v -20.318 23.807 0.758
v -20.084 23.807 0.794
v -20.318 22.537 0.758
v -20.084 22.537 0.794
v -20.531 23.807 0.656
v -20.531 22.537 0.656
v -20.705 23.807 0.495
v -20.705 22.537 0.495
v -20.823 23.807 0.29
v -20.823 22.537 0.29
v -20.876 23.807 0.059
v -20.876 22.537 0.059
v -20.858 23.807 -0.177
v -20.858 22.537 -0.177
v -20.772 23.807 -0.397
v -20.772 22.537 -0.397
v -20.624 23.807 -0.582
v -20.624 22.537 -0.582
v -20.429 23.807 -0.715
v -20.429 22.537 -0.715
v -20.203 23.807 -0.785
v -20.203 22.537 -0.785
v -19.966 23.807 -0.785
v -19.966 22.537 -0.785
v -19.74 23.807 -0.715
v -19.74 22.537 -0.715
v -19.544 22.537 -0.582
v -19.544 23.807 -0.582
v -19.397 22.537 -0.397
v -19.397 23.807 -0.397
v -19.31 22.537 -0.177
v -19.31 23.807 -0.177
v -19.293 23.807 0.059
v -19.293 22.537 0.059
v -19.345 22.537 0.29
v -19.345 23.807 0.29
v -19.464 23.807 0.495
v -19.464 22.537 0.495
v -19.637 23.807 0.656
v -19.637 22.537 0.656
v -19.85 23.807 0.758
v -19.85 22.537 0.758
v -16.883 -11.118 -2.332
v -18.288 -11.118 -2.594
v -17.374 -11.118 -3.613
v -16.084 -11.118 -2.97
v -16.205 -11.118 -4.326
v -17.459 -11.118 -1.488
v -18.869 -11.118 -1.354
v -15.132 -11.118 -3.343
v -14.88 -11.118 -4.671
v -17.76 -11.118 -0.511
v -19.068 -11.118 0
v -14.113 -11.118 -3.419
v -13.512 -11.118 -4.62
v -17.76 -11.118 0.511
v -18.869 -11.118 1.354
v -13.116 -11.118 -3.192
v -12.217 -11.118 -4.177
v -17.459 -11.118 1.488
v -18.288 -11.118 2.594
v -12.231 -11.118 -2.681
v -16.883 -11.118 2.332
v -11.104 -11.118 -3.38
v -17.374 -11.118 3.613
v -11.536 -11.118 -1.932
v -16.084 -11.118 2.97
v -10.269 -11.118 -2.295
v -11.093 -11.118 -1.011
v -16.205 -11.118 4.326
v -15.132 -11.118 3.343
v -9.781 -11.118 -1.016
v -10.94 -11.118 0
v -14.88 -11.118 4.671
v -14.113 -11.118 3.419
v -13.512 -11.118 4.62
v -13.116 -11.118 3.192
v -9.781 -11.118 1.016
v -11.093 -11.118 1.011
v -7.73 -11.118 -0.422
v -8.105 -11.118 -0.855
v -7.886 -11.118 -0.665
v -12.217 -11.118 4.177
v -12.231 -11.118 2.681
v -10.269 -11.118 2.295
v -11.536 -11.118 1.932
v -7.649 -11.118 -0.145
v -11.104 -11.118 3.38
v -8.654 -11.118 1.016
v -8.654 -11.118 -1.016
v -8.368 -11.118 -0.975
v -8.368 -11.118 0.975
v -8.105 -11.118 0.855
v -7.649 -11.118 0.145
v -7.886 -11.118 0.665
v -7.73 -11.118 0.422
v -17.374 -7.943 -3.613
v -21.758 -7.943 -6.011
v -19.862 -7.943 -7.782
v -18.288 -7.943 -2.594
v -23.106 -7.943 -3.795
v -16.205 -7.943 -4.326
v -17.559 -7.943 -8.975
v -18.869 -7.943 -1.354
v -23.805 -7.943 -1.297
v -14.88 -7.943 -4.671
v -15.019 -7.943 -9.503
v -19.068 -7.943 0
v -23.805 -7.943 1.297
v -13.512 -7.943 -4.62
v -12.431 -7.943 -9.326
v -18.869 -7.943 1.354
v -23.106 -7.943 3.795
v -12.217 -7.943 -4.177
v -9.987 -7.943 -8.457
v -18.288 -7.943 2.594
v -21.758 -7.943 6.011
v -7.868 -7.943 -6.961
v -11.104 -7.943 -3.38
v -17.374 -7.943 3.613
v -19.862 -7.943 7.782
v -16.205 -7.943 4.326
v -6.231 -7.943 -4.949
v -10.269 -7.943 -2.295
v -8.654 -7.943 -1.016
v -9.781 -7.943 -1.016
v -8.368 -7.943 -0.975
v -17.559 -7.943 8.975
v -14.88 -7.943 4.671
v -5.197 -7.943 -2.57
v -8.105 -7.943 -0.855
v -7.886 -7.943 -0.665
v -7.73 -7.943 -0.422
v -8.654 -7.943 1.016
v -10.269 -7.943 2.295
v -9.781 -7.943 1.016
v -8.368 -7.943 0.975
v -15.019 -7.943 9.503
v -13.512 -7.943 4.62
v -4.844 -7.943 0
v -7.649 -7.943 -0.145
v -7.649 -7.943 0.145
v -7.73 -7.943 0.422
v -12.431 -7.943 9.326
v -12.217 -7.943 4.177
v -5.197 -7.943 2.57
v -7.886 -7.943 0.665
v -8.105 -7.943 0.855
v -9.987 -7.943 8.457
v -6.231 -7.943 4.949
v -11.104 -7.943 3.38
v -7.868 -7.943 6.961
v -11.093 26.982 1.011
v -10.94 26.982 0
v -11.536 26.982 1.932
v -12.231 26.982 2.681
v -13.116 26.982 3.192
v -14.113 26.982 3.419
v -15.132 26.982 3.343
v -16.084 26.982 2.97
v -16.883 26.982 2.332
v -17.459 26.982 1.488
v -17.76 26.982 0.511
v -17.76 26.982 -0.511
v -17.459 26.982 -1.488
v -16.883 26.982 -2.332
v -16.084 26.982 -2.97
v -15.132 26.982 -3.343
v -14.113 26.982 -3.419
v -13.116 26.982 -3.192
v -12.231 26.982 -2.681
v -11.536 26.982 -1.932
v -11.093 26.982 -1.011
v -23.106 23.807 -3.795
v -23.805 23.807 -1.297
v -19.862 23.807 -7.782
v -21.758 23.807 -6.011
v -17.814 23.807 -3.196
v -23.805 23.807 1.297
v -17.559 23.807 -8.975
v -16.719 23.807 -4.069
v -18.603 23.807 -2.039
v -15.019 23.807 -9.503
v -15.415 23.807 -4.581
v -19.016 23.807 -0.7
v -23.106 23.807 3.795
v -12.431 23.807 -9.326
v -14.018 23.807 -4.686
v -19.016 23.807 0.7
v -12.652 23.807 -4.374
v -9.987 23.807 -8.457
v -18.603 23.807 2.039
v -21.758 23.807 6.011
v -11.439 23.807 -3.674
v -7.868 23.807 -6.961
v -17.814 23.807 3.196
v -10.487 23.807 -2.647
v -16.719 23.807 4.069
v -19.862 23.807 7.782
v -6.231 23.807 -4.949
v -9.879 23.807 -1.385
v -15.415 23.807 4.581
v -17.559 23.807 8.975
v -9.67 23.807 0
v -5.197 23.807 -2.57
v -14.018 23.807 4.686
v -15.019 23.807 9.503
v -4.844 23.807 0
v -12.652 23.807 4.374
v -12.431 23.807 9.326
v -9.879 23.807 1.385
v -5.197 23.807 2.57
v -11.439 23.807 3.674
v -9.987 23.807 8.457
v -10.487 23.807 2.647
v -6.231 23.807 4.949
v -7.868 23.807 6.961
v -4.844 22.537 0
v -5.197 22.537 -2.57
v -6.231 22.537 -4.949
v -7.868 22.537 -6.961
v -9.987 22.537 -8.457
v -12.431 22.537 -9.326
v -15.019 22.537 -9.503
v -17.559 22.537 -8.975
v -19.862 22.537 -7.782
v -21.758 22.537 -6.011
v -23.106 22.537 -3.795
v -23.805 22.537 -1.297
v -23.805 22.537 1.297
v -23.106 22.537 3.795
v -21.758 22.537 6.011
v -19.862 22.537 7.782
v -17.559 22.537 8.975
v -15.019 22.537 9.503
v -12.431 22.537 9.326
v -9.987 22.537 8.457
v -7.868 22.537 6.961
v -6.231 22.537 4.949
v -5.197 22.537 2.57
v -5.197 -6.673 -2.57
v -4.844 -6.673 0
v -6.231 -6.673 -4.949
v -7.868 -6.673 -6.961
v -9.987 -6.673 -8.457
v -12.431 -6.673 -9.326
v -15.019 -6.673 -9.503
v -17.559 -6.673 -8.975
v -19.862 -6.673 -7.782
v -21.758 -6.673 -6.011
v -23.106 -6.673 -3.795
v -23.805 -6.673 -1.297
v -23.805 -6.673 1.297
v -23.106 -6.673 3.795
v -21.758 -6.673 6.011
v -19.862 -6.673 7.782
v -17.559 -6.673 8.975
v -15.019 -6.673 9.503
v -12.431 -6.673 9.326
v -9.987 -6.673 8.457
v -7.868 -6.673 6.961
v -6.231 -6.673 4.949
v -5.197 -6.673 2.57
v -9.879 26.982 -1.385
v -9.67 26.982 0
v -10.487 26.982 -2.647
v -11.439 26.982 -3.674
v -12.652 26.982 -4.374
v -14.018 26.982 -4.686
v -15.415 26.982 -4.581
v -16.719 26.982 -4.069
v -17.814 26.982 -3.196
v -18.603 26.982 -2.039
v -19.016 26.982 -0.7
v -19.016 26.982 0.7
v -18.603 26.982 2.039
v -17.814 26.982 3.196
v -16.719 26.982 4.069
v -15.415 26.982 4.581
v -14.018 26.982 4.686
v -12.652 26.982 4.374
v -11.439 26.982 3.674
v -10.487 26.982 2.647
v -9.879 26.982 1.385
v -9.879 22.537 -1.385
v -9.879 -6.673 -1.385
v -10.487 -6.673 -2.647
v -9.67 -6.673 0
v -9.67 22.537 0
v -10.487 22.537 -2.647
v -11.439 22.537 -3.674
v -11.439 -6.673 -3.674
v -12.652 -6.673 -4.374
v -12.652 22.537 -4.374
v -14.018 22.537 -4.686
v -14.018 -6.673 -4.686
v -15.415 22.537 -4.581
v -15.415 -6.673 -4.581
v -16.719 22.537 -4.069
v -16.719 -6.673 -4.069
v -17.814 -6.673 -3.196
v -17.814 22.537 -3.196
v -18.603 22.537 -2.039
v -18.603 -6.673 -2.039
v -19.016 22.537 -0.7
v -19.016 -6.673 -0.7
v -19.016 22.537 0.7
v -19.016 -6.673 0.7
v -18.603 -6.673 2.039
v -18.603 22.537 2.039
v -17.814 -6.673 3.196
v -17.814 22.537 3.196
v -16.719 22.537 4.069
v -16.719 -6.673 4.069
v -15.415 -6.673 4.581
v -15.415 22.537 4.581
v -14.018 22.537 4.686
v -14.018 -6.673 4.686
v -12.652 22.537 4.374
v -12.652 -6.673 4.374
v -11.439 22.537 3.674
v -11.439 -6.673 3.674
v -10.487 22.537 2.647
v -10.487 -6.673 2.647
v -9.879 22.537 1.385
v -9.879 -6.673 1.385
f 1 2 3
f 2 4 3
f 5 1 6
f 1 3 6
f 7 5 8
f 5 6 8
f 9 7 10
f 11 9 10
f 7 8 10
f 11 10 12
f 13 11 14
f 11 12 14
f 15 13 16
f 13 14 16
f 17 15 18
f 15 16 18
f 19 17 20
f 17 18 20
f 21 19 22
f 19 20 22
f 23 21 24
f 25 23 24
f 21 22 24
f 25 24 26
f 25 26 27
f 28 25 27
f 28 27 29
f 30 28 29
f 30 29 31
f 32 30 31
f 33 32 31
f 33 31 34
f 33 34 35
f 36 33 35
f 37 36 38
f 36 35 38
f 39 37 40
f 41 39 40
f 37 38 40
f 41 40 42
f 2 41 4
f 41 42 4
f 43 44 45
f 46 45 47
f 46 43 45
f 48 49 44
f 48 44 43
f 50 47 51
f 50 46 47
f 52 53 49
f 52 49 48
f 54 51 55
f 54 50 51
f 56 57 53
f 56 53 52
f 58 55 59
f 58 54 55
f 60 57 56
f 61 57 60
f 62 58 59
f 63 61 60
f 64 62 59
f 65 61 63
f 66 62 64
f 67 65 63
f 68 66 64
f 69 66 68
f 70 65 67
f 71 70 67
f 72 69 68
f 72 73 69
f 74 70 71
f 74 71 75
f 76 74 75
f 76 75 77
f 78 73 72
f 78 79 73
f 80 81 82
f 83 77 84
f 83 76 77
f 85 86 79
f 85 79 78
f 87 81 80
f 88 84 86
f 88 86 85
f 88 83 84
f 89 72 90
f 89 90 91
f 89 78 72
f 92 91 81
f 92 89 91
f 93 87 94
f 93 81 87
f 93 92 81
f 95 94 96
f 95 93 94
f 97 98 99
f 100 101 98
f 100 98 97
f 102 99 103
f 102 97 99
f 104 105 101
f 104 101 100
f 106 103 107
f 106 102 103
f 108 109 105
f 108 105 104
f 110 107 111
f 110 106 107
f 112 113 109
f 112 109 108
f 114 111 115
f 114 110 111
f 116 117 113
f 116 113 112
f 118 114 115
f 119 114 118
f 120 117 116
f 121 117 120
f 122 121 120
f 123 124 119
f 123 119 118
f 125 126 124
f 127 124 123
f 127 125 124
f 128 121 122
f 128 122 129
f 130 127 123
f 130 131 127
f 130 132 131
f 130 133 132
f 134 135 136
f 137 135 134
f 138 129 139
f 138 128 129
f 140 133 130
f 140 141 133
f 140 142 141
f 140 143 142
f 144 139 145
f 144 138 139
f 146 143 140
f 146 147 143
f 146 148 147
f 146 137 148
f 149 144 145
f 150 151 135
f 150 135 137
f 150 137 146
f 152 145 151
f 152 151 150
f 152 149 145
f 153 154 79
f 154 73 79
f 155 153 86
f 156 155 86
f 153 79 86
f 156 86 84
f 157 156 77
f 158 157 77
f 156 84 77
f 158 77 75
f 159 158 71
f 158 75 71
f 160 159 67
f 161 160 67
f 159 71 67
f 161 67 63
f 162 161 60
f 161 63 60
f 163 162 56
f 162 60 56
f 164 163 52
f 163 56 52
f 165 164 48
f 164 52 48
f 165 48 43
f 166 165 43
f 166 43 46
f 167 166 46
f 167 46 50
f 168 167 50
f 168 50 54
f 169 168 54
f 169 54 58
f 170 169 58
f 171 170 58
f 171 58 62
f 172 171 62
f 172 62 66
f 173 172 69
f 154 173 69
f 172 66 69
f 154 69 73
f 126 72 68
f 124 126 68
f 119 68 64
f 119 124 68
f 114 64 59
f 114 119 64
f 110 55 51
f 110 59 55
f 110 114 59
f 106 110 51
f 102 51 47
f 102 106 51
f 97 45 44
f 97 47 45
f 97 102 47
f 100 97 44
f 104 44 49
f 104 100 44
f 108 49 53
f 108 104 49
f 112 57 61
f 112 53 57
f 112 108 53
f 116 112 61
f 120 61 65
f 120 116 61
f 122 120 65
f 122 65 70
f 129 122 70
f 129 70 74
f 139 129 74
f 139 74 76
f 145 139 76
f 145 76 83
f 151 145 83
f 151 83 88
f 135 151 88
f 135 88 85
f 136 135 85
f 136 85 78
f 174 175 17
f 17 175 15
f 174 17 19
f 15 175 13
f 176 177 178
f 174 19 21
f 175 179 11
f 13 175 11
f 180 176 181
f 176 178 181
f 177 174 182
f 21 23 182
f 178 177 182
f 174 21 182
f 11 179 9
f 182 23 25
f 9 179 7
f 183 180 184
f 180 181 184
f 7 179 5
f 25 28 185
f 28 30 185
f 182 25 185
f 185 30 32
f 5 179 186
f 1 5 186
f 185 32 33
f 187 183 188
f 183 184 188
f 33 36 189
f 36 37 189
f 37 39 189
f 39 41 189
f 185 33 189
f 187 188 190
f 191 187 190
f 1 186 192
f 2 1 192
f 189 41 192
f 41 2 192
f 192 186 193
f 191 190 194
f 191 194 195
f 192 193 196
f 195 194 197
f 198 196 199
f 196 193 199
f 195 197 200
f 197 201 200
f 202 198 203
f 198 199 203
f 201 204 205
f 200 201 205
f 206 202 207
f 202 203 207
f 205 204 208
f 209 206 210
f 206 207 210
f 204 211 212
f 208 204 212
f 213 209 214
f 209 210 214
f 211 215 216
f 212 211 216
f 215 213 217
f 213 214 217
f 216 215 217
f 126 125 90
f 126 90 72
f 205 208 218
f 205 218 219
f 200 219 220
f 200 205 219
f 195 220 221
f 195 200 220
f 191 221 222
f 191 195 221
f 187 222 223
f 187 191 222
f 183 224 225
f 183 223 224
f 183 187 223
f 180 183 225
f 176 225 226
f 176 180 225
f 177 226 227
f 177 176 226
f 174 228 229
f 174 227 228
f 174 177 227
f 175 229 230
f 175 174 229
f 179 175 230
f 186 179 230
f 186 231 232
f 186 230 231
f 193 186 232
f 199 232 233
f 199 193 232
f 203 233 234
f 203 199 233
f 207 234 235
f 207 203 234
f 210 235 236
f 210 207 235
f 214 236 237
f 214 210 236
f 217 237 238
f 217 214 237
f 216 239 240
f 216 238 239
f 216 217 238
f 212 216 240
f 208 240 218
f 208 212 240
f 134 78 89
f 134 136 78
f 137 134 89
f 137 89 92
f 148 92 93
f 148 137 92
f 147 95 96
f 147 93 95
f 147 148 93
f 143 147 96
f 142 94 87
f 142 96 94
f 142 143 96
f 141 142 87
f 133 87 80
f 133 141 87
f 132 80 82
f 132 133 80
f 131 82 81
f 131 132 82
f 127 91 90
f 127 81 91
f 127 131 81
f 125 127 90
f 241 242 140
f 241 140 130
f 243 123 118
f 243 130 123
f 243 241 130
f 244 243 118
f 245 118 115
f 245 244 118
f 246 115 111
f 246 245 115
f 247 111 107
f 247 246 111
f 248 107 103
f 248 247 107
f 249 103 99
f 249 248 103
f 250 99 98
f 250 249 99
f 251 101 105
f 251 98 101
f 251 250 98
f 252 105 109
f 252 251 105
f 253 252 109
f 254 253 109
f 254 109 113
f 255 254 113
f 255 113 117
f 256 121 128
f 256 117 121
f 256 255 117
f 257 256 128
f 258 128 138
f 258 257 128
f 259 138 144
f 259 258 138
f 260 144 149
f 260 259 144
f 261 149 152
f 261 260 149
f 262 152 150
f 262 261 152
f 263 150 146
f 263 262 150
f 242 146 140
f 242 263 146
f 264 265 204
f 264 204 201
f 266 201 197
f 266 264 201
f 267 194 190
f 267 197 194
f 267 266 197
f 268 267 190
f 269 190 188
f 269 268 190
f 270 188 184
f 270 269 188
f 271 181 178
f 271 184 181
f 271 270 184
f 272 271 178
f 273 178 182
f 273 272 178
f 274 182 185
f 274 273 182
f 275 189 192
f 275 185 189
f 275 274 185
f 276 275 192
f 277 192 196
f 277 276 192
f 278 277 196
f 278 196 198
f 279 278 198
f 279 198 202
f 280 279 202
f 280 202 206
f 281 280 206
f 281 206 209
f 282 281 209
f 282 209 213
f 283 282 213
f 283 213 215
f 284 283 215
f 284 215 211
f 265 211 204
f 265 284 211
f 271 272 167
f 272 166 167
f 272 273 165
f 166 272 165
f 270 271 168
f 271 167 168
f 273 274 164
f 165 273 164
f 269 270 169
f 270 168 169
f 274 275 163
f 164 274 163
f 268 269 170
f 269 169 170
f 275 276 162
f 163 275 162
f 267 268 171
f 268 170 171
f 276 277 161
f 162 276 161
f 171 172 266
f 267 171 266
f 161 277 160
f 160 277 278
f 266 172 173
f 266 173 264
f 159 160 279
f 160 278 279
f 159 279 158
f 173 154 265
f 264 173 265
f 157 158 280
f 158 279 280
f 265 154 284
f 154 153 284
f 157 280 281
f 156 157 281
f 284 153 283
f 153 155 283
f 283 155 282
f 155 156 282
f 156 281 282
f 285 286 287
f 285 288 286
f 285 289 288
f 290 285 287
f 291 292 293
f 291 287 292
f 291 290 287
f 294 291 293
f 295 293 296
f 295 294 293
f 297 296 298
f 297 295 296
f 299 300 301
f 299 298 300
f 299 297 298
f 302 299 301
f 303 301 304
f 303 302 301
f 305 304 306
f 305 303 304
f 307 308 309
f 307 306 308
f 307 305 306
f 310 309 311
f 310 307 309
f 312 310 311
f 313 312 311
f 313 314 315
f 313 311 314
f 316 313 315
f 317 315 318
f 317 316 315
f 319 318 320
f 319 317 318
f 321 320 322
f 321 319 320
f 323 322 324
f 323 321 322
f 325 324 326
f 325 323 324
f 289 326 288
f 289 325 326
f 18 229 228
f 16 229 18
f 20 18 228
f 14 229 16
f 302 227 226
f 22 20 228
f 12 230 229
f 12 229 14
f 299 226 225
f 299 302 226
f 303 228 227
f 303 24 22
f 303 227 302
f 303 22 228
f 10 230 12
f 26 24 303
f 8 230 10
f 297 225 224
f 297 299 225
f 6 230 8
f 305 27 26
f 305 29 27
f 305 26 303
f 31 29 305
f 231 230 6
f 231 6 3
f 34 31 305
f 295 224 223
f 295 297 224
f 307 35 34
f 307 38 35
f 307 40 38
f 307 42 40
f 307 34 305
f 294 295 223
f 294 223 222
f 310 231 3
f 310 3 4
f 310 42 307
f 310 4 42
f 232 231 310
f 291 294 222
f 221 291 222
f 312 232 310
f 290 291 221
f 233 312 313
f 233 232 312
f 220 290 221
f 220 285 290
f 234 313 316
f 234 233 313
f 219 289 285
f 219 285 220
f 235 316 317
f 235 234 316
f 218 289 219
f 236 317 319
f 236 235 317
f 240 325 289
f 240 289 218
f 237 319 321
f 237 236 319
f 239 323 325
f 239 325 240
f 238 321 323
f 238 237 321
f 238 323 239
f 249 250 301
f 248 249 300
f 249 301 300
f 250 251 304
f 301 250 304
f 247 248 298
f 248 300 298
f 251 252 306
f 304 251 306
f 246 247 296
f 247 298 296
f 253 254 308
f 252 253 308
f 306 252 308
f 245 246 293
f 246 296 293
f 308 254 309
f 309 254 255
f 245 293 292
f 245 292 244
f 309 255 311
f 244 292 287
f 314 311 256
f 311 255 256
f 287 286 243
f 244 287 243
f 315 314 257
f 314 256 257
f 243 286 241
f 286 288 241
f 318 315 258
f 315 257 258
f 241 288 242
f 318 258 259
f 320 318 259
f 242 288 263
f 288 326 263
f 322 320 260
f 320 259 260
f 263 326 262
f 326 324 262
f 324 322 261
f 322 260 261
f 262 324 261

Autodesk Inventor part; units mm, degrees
ref_plane "YZ Plane" through (0, 0, 0) normal (1, 0, 0) x (0, 1, 0)
ref_plane "XZ Plane" through (0, 0, 0) normal (0, 1, 0) x (-1, 0, 0)
ref_plane "XY Plane" through (0, 0, 0) normal (0, 0, 1) x (1, 0, 0)
sketch "Sketch1" plane through (0, 0, 0) normal (0, 0, 1) x (1, 0, 0)
  line L0 (-10.9402, 26.9819) -> (-10.9402, -11.1181)
  line L1 (-10.9402, -11.1181) -> (-9.6702, -11.1181)
  line L2 (-9.6702, -11.1181) -> (-9.6702, -7.9431)
  line L3 (-9.6702, -7.9431) -> (-4.8442, -7.9431)
  line L4 (-4.8442, -7.9431) -> (-4.8442, -6.6731)
  line L5 (-4.8442, -6.6731) -> (-9.6702, -6.6731)
  line L6 (-9.6702, -6.6731) -> (-9.6702, 22.5369)
  line L7 (-9.6702, 22.5369) -> (-4.8442, 22.5369)
  line L8 (-4.8442, 22.5369) -> (-4.8442, 23.8069)
  line L9 (-4.8442, 23.8069) -> (-9.6702, 23.8069)
  line L10 (-9.6702, 23.8069) -> (-9.6702, 26.9819)
  line L11 (-9.6702, 26.9819) -> (-10.9402, 26.9819)
  line L12 (-14.3692, 26.9819) -> (-14.3692, -11.1181) construction
  dimension "d0" = 9.525
  dimension "d1" = 4.699
  dimension "d2" = 38.1
  dimension "d3" = 3.175
  dimension "d4" = 1.27
  dimension "d5" = 1.27
revolve "Revolution1" add sketch "Sketch1" angle 360 about axis through (-14.3692, 26.9819, 0) along (0, -1, 0)
sketch "Sketch2" plane through (-14.3692, 23.8069, 0) normal (0, 1, 0) x (1, 0, 0)
  circle A0 centre (0, 0) radius 9.525 projected
  point P0 (-5.715, 0)
  dimension "d18" = 5.715
hole "Hole1" at (-20.0842, 23.8069, 0) direction (0, -1, 0) diameter 1.5875 end up to surface
sketch "Sketch3" plane through (-14.3692, -7.9431, 0) normal (0, -1, 0) x (1, 0, 0)
  circle A0 centre (0, 0) radius 4.699 projected
  line L0 (4.5878, 1.016) -> (5.715, 1.016)
  arc A1 (5.715, -1.016) -> (5.715, 1.016) centre (5.715, 0) ccw
  line L1 (5.715, -1.016) -> (4.5878, -1.016)
  dimension "d26" = 2.032
  dimension "d27" = 5.715
extrude "Extrusion1" add sketch "Sketch3" along normal up to surface (3.175 mm away) contours A0 L0 A1 L1
properties part number "bobbin" material "Delrin, Black"
